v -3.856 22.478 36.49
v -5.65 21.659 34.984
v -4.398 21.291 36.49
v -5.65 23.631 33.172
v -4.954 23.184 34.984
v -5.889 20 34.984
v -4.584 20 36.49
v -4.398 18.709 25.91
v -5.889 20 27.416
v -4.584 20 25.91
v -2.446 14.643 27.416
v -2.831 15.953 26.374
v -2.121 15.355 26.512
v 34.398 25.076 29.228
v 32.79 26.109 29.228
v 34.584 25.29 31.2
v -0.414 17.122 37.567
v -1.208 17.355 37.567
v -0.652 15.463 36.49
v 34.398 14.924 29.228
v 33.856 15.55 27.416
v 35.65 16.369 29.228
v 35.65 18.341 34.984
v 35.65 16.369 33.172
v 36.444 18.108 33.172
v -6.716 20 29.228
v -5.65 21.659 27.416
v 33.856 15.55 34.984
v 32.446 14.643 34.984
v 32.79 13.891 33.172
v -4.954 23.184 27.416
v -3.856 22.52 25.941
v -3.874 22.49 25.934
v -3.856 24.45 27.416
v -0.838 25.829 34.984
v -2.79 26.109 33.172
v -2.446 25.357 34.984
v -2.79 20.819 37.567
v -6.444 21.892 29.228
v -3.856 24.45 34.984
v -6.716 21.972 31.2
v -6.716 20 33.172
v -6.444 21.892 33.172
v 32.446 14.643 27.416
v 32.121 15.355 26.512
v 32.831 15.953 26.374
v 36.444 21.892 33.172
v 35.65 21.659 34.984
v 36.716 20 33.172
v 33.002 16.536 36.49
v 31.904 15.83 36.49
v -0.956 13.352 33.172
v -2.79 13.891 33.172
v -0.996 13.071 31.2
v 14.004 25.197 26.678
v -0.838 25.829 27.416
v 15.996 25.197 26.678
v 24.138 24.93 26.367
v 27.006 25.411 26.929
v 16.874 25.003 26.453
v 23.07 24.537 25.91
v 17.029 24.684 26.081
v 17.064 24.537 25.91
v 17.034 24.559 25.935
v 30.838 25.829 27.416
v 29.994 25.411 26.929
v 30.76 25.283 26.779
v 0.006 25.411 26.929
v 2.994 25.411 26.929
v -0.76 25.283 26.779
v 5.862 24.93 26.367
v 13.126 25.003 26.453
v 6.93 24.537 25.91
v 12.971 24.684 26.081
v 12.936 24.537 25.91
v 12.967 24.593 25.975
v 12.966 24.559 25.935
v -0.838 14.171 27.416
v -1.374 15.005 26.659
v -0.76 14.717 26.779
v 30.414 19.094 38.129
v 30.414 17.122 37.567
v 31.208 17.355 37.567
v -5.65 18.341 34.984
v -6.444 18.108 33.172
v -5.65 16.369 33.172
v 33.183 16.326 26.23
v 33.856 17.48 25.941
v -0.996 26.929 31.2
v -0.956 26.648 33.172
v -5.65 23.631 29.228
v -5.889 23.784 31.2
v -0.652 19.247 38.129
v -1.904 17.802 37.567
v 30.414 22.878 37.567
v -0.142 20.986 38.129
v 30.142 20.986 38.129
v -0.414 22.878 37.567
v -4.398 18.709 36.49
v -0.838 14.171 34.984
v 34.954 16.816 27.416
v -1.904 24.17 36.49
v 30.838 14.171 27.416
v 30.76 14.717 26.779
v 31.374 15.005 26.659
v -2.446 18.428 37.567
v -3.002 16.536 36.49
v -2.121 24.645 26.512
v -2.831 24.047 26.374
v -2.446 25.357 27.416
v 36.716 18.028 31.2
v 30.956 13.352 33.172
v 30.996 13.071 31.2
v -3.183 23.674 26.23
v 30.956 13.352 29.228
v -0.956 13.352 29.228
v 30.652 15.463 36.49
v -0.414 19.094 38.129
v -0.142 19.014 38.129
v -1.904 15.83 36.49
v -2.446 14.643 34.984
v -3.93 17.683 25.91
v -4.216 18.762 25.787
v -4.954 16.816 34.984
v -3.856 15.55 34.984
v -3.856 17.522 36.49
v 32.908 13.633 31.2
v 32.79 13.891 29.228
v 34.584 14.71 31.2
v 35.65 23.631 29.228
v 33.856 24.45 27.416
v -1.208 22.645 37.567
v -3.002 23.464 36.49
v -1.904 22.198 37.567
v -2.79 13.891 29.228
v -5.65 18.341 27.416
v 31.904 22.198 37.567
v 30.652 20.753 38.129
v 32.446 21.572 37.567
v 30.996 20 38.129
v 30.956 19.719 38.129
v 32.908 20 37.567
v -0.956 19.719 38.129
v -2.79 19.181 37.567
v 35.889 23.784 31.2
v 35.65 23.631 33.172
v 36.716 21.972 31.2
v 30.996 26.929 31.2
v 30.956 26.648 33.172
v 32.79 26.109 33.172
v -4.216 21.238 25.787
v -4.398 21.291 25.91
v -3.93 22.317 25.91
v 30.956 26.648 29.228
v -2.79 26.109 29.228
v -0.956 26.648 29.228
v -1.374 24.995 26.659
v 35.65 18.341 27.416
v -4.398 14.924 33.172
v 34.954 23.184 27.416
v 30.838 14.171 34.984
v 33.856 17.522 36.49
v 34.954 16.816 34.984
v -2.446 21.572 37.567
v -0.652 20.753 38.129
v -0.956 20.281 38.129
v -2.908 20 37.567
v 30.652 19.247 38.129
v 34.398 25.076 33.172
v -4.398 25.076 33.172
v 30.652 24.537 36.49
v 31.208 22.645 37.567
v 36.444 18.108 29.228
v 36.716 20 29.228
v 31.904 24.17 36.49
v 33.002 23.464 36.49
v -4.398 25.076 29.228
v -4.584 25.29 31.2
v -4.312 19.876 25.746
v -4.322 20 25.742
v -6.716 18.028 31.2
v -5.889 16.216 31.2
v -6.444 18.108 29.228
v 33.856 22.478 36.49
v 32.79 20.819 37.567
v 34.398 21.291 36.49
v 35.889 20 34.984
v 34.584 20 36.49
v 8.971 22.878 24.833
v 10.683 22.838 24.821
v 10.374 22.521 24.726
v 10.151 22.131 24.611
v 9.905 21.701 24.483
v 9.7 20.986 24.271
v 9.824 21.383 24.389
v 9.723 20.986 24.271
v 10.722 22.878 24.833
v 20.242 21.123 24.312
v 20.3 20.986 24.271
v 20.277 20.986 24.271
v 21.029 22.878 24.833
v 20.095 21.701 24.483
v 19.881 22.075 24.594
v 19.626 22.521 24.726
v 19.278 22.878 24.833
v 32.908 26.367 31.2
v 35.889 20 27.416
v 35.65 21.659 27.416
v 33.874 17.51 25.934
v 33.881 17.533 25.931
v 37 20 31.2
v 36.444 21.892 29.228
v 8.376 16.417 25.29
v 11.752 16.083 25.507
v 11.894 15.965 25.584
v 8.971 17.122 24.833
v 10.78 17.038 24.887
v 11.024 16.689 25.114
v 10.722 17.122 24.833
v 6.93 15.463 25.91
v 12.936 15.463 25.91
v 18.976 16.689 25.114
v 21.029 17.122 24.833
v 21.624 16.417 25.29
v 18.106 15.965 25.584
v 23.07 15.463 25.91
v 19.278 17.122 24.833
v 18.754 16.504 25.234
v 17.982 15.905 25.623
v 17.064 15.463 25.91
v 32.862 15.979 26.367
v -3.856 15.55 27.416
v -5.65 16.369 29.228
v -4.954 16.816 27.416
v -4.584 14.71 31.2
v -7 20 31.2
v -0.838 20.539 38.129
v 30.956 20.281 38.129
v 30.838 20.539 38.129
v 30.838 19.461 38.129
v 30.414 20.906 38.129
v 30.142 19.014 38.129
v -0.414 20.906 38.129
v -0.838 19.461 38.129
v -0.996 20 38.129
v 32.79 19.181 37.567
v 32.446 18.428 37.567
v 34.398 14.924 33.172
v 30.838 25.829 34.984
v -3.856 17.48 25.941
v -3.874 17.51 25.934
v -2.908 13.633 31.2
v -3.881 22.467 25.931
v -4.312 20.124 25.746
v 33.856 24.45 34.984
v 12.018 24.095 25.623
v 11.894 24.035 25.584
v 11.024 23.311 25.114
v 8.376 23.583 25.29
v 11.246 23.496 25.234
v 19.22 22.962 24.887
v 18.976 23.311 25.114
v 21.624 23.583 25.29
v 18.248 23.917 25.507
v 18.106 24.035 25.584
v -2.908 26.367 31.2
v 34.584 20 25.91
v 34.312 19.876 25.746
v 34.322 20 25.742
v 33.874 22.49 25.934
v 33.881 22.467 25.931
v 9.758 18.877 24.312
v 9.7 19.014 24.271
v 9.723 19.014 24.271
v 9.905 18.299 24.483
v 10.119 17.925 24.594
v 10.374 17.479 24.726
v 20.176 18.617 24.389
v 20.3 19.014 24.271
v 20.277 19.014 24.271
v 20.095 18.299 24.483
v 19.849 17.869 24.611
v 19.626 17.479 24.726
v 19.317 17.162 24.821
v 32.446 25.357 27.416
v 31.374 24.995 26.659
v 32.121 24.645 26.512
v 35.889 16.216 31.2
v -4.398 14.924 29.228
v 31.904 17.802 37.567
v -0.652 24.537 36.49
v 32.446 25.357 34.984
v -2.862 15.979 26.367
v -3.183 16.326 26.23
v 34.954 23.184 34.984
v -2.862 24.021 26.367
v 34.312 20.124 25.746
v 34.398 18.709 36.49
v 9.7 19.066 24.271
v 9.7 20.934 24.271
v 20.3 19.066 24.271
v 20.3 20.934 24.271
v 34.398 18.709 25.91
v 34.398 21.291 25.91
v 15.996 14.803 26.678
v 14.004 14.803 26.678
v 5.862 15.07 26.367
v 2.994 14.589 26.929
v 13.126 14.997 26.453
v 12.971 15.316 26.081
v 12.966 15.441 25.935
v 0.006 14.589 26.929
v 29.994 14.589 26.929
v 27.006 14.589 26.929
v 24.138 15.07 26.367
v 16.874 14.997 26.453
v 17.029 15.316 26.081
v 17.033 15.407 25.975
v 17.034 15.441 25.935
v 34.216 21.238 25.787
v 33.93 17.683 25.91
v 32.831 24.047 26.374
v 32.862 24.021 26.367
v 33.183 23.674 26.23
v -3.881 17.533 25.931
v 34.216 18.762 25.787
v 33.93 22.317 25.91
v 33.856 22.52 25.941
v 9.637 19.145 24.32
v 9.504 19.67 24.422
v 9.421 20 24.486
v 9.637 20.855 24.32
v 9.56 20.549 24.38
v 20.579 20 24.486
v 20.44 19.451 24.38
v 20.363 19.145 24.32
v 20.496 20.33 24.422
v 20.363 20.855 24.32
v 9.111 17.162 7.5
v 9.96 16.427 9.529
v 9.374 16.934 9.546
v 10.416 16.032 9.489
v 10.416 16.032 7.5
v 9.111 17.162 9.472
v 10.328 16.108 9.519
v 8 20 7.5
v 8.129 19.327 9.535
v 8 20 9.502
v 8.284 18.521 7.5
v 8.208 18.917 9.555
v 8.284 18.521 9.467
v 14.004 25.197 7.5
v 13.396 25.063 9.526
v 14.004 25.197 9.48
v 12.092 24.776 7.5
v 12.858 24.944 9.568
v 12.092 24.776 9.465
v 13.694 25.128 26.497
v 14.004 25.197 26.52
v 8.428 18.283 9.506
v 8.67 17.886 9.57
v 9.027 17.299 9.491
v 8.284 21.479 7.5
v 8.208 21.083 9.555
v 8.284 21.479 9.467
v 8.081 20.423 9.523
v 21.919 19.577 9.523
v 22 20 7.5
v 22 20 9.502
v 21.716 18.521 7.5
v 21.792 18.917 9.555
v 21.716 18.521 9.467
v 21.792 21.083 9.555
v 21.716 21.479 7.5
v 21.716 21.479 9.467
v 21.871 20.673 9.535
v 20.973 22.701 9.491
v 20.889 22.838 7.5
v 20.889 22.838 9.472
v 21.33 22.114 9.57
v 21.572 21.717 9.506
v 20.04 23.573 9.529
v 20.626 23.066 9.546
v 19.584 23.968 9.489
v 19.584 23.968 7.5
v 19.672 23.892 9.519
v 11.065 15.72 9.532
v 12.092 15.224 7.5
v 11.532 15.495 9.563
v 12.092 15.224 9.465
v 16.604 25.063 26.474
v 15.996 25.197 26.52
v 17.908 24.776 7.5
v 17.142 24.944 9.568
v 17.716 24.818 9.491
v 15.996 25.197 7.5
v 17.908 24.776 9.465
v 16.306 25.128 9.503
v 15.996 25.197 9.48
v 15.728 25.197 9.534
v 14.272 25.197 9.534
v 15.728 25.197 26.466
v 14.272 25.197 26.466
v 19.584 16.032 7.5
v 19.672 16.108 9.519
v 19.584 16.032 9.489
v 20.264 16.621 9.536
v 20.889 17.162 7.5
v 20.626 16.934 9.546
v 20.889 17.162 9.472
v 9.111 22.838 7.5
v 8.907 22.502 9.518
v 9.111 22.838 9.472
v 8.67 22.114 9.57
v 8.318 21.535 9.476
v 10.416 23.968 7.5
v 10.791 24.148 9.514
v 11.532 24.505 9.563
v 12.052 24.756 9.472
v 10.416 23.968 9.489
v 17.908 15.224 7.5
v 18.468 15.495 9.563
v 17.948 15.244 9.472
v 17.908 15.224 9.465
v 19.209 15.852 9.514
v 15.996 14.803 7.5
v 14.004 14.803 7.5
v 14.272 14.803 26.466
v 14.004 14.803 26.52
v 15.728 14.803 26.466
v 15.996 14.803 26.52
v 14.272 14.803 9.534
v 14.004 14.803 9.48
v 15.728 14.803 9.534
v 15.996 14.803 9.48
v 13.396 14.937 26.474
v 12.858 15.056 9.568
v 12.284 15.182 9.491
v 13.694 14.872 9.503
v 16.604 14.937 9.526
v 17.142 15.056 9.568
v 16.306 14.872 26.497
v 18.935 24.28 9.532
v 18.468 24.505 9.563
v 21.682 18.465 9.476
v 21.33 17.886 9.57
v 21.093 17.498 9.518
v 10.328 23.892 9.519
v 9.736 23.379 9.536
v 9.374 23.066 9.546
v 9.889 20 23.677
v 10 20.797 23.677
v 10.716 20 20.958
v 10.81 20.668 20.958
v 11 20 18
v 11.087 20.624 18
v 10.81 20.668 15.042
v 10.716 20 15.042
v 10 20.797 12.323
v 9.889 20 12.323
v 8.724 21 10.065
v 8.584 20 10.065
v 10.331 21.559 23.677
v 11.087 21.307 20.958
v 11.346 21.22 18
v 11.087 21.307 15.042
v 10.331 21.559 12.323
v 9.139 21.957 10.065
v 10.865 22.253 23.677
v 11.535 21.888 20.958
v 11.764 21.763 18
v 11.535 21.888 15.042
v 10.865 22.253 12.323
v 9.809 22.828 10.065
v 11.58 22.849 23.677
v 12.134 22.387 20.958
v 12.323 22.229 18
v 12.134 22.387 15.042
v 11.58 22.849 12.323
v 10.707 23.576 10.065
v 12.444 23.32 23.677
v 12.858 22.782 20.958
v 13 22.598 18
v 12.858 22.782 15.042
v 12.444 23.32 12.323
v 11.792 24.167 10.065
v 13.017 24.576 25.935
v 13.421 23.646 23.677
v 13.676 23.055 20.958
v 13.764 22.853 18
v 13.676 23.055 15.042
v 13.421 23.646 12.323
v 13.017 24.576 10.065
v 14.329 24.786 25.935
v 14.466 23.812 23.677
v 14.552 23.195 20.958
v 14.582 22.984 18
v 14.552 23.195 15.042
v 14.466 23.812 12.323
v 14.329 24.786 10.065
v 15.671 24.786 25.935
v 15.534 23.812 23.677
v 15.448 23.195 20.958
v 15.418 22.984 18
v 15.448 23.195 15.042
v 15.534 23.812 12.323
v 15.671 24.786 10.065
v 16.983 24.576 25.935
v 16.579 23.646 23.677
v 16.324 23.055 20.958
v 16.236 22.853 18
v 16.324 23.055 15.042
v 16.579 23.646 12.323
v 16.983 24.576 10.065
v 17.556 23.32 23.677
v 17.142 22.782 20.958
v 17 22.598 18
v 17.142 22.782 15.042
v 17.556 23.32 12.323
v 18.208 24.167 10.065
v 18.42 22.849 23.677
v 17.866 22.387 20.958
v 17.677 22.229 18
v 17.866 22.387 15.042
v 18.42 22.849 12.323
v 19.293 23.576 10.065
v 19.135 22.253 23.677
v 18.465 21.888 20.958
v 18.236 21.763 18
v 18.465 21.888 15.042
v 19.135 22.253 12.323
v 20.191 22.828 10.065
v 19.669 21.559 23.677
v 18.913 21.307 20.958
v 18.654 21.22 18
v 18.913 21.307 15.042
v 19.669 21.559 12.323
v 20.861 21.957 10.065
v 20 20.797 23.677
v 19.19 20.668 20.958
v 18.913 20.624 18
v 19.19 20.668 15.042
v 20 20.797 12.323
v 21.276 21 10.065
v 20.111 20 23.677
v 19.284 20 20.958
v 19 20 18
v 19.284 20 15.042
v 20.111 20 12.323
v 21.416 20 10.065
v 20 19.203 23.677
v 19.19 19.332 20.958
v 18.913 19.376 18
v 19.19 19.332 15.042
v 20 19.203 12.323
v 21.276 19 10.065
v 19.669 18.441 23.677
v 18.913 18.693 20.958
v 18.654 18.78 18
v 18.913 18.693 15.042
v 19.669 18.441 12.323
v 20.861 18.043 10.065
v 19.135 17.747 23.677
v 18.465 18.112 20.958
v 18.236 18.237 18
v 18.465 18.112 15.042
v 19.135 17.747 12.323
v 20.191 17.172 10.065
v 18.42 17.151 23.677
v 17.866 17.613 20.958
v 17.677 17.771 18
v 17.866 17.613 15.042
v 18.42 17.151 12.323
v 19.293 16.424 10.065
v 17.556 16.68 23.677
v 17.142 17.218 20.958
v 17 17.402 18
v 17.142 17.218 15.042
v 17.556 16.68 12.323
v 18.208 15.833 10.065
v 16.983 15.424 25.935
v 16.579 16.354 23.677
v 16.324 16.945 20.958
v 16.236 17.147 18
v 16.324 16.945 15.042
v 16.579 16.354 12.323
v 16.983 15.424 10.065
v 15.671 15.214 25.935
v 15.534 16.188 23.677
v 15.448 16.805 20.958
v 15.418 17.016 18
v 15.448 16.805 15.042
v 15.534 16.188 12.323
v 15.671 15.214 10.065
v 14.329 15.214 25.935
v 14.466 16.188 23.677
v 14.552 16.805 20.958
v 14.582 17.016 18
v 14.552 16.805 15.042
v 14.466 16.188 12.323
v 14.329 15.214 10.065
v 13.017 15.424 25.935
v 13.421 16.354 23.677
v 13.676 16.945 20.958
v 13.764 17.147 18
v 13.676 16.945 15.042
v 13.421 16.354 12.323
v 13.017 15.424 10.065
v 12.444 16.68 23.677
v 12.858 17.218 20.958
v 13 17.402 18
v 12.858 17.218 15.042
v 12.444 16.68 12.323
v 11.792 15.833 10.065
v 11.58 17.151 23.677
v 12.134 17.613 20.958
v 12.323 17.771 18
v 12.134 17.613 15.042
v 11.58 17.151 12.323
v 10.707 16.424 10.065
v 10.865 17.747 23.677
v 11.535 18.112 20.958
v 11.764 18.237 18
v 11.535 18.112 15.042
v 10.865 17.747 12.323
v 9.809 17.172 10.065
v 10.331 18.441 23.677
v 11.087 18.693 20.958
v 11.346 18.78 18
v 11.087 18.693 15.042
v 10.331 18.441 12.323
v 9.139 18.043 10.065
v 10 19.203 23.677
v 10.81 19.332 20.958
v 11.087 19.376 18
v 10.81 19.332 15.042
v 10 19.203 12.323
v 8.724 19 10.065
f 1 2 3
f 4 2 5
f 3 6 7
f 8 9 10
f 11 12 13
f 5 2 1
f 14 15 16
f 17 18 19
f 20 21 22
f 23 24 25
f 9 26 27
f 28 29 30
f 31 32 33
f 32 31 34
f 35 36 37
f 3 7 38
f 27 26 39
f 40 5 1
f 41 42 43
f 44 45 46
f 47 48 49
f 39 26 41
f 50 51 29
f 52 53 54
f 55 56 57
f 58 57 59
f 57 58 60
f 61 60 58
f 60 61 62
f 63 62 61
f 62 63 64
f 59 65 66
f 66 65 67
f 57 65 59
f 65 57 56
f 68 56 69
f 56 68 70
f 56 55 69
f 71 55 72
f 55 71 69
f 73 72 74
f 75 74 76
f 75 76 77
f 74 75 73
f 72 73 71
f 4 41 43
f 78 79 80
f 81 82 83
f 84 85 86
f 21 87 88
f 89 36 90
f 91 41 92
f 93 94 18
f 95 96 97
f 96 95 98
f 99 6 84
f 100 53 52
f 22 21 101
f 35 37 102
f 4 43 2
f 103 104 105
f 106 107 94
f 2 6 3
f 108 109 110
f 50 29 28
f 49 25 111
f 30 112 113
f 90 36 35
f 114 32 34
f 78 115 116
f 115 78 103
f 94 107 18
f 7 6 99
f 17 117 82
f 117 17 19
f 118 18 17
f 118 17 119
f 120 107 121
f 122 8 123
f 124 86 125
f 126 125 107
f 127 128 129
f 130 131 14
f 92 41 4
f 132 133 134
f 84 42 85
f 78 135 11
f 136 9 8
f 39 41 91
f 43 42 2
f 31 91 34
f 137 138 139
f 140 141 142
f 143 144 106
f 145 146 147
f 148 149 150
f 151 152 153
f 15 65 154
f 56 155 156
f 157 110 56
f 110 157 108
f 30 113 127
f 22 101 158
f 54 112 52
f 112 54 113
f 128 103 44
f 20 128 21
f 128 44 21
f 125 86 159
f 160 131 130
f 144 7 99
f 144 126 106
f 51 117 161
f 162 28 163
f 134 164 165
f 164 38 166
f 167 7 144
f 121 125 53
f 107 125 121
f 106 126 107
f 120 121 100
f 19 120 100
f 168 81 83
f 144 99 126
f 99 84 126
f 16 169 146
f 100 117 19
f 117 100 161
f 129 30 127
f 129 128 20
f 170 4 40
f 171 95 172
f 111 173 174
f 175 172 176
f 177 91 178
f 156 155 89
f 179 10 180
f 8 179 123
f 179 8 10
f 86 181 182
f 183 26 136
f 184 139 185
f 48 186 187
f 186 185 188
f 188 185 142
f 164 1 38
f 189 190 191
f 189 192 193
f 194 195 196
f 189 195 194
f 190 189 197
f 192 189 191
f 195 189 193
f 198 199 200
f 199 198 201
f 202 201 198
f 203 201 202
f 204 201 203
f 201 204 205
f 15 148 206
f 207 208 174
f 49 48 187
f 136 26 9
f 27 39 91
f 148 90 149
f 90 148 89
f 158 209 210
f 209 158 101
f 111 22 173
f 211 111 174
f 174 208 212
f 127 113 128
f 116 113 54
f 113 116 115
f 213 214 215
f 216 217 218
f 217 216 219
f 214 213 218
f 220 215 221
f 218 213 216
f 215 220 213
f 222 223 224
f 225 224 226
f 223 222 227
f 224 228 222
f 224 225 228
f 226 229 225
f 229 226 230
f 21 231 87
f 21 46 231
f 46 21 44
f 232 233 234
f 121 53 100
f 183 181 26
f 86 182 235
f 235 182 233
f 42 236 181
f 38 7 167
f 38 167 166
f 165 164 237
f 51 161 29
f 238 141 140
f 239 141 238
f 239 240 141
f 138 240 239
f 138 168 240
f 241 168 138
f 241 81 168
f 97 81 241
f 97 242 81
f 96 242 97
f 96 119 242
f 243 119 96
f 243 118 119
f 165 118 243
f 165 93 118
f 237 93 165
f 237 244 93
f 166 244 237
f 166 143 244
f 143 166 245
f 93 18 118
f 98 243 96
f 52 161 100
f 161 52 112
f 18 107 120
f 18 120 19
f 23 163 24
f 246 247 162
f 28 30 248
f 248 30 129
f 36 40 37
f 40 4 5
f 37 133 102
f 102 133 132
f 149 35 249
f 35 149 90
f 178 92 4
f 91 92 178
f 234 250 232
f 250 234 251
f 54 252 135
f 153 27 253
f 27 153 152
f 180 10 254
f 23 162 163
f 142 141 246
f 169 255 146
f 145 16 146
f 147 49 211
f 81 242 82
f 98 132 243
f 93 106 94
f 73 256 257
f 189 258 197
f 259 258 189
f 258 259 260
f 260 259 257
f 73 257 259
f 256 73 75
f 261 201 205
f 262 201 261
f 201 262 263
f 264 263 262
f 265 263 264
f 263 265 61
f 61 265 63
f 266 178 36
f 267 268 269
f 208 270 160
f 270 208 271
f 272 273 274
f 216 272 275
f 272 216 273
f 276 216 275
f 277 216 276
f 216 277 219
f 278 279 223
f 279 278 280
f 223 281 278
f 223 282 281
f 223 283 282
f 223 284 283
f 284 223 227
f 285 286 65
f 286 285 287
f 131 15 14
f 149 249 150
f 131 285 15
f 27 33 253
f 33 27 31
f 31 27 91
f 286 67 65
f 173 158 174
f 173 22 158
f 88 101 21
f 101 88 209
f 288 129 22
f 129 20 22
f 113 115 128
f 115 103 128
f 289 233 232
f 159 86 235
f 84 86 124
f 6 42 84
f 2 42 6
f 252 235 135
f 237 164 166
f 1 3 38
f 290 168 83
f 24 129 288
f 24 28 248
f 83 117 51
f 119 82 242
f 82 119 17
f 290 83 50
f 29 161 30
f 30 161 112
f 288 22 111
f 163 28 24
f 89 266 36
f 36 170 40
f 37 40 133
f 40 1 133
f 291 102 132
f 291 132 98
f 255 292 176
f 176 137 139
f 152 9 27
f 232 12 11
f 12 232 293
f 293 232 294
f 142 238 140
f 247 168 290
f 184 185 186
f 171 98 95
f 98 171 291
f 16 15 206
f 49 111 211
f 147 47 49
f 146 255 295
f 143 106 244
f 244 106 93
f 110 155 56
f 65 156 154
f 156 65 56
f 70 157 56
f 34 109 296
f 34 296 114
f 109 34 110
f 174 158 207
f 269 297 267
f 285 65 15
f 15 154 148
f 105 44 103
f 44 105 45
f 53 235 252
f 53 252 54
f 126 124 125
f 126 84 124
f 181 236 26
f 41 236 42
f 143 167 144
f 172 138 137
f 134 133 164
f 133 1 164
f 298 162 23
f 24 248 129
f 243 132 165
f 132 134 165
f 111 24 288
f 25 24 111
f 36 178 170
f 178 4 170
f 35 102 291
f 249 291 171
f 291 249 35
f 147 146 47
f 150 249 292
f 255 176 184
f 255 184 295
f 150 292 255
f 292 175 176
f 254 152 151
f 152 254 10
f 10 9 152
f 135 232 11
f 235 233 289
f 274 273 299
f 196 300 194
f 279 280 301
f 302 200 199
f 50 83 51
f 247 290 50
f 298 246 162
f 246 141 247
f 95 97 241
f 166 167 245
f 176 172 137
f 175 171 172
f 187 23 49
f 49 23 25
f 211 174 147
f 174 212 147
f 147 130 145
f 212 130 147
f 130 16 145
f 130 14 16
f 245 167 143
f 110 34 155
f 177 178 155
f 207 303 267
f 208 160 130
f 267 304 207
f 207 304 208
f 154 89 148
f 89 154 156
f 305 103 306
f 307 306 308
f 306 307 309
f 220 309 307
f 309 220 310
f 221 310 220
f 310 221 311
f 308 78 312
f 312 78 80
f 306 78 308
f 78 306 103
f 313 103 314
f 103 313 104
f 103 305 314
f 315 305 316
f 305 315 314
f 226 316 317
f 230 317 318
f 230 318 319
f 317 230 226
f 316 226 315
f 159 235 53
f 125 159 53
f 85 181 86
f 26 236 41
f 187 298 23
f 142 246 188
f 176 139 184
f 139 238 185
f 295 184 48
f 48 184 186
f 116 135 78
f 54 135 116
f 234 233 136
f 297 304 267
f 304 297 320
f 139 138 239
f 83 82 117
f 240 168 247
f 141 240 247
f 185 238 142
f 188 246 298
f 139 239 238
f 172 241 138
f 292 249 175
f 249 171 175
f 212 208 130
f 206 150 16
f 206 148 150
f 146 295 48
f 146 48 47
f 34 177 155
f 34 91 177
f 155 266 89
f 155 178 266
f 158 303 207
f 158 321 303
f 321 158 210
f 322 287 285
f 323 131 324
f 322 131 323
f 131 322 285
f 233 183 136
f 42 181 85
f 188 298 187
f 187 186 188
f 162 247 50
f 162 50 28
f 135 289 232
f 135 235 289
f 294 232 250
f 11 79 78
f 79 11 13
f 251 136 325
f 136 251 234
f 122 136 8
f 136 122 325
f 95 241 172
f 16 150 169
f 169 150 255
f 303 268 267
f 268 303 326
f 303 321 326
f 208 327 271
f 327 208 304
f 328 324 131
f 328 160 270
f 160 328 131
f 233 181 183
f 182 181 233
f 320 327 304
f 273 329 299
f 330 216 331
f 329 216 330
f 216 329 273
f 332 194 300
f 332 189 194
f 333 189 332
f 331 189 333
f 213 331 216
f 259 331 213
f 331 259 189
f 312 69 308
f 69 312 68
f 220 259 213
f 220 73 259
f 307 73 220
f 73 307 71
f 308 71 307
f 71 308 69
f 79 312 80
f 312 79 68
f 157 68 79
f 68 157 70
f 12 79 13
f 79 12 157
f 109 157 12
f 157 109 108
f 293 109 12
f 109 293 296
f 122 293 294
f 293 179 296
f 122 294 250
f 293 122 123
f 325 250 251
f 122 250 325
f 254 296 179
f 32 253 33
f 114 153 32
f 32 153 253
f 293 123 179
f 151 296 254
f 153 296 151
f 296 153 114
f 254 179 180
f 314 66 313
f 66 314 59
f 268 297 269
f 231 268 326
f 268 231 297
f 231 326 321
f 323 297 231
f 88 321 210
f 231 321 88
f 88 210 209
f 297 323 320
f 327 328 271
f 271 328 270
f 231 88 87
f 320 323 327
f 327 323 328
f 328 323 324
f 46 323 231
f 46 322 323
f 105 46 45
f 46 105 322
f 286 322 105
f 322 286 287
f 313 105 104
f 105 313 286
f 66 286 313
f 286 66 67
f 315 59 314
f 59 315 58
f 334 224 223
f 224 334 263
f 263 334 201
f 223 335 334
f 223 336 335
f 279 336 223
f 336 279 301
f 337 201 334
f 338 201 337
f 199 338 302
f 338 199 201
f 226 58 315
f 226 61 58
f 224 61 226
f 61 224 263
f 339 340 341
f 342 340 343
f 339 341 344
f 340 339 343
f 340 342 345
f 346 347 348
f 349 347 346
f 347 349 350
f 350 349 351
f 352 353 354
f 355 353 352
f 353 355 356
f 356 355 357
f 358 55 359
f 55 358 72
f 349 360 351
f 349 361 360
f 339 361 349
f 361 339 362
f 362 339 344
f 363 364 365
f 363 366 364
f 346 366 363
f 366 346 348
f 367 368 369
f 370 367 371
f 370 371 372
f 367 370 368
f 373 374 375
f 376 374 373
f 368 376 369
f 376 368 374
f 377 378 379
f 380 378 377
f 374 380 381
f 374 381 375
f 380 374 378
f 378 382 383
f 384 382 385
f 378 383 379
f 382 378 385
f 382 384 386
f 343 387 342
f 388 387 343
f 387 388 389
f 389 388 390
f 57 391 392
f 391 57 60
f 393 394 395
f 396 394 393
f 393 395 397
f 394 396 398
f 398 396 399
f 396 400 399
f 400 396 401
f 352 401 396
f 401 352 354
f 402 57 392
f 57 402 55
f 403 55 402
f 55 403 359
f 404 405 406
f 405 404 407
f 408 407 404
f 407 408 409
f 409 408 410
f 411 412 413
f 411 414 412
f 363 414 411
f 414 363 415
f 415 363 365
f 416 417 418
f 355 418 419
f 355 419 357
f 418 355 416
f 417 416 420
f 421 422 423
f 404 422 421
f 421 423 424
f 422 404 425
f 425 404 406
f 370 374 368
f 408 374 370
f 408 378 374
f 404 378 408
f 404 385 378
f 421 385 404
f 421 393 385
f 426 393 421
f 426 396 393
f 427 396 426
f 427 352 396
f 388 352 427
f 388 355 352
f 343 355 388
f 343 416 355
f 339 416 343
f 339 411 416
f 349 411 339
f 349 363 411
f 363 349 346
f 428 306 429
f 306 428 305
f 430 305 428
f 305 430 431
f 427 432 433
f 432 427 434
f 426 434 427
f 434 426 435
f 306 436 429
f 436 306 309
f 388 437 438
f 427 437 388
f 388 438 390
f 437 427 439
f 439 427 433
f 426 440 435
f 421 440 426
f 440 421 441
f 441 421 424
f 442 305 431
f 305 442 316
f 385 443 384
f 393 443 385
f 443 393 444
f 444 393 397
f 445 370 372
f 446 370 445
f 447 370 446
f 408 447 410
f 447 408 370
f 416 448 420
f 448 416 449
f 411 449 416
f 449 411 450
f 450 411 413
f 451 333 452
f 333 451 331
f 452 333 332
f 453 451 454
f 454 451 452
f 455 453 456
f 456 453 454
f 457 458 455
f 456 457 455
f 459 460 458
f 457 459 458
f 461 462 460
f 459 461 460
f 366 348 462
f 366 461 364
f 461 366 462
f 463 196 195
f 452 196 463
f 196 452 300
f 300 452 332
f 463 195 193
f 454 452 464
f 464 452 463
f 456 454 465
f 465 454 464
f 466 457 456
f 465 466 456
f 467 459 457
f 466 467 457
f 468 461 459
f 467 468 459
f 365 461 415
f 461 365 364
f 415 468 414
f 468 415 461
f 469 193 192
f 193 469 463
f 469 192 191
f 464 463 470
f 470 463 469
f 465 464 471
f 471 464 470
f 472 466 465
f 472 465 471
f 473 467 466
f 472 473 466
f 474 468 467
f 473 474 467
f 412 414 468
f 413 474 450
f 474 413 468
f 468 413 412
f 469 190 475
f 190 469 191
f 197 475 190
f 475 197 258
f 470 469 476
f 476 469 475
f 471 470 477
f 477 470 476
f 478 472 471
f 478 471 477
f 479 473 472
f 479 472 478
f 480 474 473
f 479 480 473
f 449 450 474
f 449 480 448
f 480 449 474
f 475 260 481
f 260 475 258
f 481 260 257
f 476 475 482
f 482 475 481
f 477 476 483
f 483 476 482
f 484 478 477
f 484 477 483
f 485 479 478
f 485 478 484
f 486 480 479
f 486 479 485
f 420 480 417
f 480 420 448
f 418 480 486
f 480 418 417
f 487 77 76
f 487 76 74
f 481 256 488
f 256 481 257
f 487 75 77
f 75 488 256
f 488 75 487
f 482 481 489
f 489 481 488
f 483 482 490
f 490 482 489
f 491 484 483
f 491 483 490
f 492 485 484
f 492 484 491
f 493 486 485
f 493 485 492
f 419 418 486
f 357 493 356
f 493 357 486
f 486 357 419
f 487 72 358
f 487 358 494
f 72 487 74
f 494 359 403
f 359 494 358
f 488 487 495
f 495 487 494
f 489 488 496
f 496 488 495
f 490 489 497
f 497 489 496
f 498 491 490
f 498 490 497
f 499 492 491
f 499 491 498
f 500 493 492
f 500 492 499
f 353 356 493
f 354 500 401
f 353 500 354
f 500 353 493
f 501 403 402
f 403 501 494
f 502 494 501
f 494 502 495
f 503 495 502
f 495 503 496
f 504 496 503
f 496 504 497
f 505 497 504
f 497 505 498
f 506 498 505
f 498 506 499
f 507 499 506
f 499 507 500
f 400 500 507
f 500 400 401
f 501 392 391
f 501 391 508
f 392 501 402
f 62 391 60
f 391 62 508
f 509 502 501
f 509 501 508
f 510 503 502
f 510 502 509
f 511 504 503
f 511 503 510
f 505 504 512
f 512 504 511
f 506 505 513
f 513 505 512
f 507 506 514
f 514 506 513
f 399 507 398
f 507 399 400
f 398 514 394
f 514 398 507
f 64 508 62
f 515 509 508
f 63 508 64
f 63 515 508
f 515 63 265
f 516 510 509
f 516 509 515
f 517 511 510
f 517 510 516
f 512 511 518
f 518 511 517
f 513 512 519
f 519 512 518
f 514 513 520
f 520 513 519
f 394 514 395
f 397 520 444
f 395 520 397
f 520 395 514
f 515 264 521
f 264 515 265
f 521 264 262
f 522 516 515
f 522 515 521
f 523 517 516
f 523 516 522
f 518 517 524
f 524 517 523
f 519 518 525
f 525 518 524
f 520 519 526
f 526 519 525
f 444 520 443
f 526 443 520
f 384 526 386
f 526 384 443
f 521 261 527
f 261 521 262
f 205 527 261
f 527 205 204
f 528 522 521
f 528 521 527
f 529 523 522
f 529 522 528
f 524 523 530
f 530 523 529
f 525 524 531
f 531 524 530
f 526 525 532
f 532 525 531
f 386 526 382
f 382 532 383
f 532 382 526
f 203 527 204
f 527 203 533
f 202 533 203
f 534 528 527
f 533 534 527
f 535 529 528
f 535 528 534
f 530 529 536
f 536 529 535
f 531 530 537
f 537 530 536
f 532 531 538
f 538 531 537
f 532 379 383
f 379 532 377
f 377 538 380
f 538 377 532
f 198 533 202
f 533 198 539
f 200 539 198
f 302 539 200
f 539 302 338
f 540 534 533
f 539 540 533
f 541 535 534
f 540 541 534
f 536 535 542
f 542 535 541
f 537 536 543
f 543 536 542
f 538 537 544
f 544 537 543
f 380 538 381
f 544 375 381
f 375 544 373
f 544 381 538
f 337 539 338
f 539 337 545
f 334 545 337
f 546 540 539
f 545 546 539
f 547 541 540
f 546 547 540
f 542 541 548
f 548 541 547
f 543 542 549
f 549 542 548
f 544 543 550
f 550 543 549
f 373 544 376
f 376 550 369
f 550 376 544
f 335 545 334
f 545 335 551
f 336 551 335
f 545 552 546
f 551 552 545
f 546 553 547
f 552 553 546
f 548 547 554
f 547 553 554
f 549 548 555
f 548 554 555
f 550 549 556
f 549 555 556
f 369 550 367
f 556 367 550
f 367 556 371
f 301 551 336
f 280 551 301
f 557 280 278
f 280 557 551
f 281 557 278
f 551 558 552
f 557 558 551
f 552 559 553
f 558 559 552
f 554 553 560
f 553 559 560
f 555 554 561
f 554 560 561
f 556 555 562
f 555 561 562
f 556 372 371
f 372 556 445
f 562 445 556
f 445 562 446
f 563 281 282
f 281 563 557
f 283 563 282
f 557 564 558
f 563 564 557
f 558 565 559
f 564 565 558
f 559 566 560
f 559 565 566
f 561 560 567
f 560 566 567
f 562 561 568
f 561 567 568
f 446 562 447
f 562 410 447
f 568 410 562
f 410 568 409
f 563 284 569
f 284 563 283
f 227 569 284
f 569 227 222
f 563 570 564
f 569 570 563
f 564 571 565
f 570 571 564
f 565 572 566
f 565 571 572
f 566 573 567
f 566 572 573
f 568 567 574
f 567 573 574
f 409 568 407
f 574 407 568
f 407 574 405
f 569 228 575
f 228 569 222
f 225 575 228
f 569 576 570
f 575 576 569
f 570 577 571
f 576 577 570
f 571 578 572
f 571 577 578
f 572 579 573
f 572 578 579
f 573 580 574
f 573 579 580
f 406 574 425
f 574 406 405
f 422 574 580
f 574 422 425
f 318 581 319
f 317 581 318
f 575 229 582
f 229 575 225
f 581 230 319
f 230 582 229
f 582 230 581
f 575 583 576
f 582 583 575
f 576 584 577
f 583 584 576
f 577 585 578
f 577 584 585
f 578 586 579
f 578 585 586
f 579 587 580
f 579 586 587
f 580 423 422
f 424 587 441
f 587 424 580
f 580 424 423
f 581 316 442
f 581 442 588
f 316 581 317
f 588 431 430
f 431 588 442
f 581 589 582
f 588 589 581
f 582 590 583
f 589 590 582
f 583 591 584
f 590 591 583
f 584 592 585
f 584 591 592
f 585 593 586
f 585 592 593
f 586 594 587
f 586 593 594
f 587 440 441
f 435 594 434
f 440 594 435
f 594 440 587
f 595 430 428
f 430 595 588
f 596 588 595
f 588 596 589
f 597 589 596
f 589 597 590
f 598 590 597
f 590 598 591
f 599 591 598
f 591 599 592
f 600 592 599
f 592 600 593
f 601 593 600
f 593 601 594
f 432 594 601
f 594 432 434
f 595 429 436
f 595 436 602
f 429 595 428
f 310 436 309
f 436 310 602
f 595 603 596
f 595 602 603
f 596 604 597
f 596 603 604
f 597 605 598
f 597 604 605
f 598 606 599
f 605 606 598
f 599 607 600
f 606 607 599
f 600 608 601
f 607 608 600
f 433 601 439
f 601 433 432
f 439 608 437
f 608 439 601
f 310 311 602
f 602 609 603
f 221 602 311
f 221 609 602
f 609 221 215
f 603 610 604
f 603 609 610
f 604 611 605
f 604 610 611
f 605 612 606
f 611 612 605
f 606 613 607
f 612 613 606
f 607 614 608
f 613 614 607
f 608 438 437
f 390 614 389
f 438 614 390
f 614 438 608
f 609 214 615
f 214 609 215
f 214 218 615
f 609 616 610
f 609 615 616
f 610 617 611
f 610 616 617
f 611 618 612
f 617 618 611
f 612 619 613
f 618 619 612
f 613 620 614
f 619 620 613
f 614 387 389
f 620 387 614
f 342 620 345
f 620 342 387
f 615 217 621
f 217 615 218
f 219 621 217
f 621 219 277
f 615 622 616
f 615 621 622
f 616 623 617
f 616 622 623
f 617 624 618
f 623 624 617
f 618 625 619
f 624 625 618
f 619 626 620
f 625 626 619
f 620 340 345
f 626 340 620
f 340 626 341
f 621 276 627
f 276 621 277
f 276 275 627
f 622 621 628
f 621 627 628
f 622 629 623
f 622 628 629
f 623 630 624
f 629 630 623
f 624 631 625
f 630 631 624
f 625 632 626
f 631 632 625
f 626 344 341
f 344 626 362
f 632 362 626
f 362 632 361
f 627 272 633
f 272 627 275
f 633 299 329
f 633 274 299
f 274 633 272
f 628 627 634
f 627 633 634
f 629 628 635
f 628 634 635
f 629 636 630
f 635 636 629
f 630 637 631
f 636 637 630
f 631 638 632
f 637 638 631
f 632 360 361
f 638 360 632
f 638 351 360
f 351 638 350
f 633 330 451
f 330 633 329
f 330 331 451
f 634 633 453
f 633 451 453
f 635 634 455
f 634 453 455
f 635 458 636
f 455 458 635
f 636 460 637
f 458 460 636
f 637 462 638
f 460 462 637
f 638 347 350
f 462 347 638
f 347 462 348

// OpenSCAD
// file: mario-star.scad
module star(sr,br,pr,ph,post=true) {
  intersection() {
    union() {
      for(i = [0:4]) {
        rotate([0,0,360/5*i]) point(sr,br);
      }
      if(post) {
        rotate([0,-90,0]) cylinder(r=pr,h=ph);
      }
    }
    cylinder(r=1000,h=1000);
  }
}

module point(sr,br) {
  hull() {
    translate([110,0,0]) sphere(r=sr, $fn=32);
    flatSphere(br);
  }
}

module flatSphere(br) {
  intersection() {
    scale([2,2,1]) sphere(r=br, $fn=64);
    translate([0,0,-5]) scale([2.5,2.5,1]) sphere(r=br, $fn=64);
  }
}

module eye(r) {
  color("#333333") {
    translate([0,20,0]) intersection() {
      hull() {
        translate([0,0,21]) {
          sphere(r=r);
          translate([0,0,-12]) cylinder(r=r,h=1);
        }
        translate([30,0,18])  {
          sphere(r=r);
          translate([0,0,-10]) cylinder(r=r,h=1);
        }
      }
      translate([0,0,13]) cylinder(r=1000,h=20);
    }
  }
}
// main file
include <./mario-star.scad>

translate([0,0,14]) doorEye();
// doorStar();


module doorStar() {
  difference() {
    intersection() {
      scale([1,1,0.435]) star(5,28,12,95,false);
      translate([-500,0,-1]) cube([1000,1000,100]);
    }
    translate([15,20,8.2]) scale([1,0.75,1]) cylinder(r=7.2,h=14);
  }
}

module doorEye() {
  color("#333333") {
    translate([0,20,0]) {
      difference() {
        translate([0,0,17.2]) hull() {
          translate([0,0,0]) sphere(r=7);
          translate([30,0,0]) sphere(r=7);
        }
        scale([1.5,1,1]) translate([1,10,6]) rotate([90,0,0]) cylinder(r=7,h=20);
        translate([27,0,0]) scale([1.5,1,1]) translate([1,10,6]) rotate([90,0,0]) cylinder(r=7,h=20);

      }
      translate([15,0,4]) scale([1,0.75,1.5]) difference() {
        translate([0,0,-7]) cylinder(r=7,h=14);
        torus(11,7);
      }
    }

  }
}

module torus(r1,r2) {
  rotate_extrude(convexity = 10, $fn=$fn)
    translate([r1, 0, 0])
    circle(r = r2, $fn=$fn);
}
